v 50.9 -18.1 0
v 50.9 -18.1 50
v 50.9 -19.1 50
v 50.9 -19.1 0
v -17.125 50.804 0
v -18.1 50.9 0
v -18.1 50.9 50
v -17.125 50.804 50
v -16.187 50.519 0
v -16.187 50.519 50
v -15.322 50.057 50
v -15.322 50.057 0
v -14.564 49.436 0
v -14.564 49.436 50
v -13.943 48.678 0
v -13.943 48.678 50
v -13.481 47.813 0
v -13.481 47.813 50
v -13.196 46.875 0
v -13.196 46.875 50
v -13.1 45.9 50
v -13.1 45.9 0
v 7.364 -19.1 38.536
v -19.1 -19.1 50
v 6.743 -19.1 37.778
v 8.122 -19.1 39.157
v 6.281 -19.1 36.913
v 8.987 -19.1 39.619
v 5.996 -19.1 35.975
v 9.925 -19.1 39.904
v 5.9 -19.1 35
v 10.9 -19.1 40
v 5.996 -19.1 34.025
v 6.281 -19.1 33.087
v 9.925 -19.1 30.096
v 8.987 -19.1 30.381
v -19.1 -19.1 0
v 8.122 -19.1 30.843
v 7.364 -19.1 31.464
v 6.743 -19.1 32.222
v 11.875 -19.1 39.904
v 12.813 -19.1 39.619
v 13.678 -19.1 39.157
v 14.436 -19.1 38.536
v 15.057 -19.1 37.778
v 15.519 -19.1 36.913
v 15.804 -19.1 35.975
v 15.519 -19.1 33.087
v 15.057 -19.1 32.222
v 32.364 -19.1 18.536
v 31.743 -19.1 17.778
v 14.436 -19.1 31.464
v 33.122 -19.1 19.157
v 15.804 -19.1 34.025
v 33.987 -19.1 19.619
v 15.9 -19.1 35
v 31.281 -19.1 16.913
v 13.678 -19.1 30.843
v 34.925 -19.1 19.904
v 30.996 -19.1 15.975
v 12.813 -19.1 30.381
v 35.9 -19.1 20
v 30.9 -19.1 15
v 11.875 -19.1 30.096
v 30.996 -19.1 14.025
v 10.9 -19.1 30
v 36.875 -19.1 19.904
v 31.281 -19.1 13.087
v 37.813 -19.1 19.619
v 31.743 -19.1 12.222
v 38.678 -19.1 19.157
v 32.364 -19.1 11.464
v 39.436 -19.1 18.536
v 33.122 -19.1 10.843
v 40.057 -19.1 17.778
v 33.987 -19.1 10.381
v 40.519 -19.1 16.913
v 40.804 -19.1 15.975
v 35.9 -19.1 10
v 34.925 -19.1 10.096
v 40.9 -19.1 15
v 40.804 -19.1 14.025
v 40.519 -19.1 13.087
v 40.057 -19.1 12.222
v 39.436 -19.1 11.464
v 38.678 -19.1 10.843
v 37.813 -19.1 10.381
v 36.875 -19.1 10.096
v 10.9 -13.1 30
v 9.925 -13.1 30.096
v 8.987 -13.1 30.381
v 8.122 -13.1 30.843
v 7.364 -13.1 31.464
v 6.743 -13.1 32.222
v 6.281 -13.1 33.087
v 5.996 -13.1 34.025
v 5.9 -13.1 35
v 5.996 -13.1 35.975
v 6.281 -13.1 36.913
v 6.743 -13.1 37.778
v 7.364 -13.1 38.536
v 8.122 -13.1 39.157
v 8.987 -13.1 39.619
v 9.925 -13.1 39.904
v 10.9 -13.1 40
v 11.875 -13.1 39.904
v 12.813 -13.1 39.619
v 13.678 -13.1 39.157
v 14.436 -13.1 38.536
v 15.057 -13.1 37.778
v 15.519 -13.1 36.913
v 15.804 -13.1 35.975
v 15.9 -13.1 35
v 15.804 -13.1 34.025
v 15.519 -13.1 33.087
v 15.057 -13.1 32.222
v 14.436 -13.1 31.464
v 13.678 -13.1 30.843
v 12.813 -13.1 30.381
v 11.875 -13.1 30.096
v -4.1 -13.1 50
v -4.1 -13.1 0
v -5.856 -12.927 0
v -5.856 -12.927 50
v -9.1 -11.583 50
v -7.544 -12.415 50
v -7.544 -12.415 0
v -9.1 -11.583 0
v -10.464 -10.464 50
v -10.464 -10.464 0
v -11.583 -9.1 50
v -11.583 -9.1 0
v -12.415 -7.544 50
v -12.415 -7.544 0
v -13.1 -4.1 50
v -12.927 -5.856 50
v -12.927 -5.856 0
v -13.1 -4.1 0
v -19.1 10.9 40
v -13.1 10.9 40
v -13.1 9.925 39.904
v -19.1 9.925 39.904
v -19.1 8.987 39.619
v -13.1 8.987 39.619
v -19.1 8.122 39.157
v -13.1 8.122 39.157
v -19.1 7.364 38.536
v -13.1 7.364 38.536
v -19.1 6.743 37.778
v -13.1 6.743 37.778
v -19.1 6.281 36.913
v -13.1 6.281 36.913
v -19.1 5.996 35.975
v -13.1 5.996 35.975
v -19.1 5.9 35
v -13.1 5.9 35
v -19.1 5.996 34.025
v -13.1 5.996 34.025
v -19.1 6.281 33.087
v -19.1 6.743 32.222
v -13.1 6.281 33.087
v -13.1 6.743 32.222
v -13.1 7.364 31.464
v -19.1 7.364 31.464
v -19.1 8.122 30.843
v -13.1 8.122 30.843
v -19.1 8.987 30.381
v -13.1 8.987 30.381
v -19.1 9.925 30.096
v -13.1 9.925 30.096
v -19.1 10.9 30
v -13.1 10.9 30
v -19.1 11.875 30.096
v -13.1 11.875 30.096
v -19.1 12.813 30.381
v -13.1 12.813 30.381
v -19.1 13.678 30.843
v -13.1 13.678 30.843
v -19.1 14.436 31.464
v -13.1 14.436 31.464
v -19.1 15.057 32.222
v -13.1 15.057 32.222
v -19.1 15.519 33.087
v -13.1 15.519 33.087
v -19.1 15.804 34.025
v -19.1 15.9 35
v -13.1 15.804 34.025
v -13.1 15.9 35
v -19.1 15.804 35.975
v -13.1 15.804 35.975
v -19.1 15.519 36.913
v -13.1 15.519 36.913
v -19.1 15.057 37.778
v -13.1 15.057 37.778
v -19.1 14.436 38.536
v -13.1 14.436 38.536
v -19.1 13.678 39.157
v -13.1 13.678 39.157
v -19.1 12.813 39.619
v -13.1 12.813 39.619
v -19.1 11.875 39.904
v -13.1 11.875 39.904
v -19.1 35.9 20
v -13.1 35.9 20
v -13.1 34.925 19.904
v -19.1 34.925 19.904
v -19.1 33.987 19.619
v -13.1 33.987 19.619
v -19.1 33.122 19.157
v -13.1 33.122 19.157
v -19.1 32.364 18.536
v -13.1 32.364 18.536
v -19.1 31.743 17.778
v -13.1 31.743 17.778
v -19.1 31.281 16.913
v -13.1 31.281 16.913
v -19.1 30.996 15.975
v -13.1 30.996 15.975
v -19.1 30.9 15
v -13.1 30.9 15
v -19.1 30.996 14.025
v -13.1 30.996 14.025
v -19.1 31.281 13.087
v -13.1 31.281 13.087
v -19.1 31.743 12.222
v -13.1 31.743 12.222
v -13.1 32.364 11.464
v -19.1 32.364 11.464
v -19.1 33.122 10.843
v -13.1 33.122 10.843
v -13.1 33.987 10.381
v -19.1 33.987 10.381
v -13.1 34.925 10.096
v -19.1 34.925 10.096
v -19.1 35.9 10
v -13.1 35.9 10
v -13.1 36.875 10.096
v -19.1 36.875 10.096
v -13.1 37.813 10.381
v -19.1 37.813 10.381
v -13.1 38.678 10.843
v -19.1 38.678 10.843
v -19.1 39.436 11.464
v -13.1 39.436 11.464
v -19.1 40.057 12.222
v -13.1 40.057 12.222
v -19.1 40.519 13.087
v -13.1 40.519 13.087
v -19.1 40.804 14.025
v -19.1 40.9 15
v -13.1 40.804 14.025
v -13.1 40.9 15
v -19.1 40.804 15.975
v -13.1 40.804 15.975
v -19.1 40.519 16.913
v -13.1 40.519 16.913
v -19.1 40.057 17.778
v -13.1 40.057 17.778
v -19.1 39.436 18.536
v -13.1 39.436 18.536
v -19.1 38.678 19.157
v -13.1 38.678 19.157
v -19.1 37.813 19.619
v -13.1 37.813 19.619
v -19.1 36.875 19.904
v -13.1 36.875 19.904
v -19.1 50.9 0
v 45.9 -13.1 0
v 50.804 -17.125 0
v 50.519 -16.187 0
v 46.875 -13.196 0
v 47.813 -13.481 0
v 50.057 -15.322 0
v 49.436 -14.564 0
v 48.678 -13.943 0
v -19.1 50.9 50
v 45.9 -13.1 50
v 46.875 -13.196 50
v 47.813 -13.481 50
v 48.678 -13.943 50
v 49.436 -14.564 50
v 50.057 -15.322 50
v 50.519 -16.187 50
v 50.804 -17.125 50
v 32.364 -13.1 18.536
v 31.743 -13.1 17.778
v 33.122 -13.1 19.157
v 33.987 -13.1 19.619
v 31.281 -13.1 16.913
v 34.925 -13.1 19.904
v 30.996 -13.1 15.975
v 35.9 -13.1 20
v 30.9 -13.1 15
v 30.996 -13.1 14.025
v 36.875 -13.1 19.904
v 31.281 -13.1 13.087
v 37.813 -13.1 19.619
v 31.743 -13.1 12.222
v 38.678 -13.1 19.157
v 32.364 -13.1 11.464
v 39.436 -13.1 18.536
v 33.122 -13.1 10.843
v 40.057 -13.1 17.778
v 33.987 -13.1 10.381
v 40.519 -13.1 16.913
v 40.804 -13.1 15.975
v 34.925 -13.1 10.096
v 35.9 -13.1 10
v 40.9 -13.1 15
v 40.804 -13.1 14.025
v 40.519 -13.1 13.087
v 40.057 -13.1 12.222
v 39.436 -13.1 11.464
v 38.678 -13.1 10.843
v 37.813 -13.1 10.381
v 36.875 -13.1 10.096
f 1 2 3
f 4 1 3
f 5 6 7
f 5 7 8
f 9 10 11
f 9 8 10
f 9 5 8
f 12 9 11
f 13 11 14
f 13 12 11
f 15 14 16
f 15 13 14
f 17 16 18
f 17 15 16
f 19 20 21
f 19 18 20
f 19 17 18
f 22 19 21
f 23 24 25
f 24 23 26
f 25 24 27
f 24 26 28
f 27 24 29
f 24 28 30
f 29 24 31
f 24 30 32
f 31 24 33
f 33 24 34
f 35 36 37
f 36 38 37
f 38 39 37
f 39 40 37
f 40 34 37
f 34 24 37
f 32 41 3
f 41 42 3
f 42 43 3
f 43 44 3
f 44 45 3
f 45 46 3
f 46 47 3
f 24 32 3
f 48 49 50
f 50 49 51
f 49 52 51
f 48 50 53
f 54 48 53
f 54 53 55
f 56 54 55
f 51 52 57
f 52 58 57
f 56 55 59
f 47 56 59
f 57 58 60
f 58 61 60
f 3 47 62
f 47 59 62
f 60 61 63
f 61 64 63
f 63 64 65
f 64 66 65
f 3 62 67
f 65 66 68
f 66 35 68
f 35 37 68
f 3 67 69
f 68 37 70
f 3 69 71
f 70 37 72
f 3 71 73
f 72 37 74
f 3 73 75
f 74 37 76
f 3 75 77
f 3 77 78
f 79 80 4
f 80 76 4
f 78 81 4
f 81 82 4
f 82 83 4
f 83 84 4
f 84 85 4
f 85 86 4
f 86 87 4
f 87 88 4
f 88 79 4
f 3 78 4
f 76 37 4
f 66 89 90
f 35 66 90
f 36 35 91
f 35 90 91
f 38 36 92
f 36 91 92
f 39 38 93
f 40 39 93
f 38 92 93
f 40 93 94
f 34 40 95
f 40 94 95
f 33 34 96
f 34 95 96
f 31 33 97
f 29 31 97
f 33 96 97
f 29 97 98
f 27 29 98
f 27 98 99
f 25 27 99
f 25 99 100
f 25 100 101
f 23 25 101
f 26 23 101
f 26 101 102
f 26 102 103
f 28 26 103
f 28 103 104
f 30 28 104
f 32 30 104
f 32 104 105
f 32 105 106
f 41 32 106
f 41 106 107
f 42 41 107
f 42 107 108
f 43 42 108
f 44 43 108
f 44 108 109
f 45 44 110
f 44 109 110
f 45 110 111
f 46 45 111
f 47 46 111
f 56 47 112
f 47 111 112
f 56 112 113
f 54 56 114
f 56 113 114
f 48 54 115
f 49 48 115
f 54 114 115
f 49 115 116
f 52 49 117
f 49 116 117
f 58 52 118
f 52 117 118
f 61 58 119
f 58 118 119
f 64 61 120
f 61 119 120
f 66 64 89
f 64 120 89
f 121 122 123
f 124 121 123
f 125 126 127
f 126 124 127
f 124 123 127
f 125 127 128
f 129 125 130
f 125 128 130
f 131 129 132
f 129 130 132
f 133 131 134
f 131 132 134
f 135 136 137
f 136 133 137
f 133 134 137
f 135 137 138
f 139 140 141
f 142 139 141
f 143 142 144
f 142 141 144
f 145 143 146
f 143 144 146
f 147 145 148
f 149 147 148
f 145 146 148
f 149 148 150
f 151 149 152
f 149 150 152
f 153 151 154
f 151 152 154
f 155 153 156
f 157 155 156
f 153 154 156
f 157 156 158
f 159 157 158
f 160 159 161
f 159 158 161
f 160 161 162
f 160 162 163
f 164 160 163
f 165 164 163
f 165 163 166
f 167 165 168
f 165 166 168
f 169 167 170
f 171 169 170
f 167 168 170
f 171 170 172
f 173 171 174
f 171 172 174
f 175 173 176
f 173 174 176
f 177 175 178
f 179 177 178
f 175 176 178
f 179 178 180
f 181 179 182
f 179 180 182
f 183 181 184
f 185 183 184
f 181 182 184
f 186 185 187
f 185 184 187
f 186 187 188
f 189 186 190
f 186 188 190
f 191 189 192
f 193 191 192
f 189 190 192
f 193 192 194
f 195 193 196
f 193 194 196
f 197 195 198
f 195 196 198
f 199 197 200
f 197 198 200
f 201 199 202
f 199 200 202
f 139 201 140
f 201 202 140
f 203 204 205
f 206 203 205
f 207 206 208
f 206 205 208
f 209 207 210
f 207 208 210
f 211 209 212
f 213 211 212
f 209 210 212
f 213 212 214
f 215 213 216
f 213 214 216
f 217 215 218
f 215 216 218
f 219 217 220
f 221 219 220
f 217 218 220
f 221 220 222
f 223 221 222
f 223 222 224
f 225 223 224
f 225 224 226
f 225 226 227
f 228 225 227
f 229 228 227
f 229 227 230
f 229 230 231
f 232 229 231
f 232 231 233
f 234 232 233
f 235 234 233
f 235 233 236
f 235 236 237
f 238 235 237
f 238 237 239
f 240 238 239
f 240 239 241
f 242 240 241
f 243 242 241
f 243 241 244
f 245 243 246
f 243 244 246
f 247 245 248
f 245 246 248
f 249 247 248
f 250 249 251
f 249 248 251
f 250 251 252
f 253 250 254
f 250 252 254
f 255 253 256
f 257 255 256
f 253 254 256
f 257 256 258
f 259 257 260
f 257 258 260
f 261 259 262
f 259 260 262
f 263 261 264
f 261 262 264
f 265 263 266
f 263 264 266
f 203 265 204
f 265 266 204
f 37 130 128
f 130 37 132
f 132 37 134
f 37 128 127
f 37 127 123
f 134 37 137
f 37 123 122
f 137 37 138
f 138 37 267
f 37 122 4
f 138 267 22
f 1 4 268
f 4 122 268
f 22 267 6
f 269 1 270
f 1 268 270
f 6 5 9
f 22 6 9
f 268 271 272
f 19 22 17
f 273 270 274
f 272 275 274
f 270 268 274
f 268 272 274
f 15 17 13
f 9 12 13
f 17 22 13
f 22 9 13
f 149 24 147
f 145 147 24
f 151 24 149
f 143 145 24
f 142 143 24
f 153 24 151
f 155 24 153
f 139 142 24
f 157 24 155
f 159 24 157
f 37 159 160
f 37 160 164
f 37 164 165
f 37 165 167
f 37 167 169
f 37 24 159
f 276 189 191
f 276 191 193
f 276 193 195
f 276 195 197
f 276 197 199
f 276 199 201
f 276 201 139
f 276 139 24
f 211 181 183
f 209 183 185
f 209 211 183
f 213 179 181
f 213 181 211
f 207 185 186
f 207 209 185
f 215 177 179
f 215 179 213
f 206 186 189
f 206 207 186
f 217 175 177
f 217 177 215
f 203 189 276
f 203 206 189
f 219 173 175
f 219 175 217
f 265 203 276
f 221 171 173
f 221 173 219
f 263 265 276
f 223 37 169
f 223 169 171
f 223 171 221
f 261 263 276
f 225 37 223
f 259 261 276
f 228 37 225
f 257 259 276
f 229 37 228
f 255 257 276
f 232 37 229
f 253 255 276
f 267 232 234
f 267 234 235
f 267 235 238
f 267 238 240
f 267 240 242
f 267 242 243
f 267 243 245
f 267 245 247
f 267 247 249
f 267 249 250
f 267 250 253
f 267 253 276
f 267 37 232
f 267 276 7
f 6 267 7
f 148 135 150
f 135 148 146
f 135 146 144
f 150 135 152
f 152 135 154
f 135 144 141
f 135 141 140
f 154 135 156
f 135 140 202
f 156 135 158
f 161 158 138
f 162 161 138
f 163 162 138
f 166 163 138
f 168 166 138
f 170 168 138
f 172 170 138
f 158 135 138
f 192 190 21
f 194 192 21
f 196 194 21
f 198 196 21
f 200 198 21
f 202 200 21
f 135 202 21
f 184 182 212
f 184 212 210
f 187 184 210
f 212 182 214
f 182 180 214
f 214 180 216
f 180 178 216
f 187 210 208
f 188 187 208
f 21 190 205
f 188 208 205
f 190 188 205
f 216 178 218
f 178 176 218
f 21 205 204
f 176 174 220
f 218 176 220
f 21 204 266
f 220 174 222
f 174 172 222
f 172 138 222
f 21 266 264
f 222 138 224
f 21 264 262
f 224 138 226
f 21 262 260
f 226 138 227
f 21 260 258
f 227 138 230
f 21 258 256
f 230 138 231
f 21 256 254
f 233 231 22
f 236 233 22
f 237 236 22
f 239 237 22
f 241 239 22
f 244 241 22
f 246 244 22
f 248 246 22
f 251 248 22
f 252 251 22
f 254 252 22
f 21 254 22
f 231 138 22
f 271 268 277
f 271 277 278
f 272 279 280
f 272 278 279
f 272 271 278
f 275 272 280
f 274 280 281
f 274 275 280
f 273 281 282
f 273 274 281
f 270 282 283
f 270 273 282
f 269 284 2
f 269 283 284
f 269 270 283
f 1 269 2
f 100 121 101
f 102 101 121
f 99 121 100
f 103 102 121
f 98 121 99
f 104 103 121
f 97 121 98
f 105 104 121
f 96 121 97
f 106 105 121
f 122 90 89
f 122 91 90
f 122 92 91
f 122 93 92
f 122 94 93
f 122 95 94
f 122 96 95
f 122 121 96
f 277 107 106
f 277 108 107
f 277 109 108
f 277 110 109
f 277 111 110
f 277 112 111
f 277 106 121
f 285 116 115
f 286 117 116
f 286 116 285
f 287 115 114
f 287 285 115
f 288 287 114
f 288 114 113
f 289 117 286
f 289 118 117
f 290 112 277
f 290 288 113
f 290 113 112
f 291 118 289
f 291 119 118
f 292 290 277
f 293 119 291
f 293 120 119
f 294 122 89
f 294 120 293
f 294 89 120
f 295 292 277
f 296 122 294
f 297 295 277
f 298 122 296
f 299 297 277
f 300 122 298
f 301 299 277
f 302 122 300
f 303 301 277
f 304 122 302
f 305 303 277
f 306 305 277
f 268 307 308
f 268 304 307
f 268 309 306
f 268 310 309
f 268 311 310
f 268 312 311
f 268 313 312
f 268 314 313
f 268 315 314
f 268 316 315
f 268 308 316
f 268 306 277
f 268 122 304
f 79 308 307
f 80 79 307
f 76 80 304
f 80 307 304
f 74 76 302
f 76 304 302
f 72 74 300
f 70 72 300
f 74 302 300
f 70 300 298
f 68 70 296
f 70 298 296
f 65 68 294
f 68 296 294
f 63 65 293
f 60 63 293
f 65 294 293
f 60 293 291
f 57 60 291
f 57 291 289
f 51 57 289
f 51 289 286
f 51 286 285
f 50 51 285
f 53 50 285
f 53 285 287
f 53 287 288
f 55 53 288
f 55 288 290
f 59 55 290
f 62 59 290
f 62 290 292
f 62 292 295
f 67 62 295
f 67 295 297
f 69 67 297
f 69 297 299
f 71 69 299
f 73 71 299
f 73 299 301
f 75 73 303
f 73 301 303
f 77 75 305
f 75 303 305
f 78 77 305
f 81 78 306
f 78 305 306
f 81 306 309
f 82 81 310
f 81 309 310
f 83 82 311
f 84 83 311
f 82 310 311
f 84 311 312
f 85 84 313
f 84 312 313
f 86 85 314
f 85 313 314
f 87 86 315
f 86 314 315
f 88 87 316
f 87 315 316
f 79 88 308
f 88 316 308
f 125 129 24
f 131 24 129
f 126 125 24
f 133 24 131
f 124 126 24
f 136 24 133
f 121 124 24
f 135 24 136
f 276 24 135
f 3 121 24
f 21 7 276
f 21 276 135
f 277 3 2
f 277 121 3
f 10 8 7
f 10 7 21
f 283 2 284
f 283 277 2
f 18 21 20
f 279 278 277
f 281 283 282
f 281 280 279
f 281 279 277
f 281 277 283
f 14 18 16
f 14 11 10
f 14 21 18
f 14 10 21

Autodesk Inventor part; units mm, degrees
ref_plane "YZ Plane" through (0, 0, 0) normal (1, 0, 0) x (0, 1, 0)
ref_plane "Startebene" through (0, 0, 0) normal (0, 0, 1) x (1, 0, 0)
ref_plane "Endebene" through (0, 0, 50) normal (0, 0, 1) x (1, 0, 0)
sketch "Skizze2" plane through (0, 0, 0) normal (0, 0, 1) x (1, 0, 0)
  line L0 (-13.1, -4.1) -> (-13.1, 45.9)
  line L1 (-19.1, 50.9) -> (-18.1, 50.9)
  line L2 (-19.1, -19.1) -> (-19.1, 50.9)
  line L3 (-19.1, -19.1) -> (50.9, -19.1)
  line L4 (50.9, -18.1) -> (50.9, -19.1)
  line L5 (-4.1, -13.1) -> (45.9, -13.1)
  arc A0 (-13.1, -4.1) -> (-4.1, -13.1) centre (-4.1, -4.1) ccw
  arc A1 (-13.1, 45.9) -> (-18.1, 50.9) centre (-18.1, 45.9) ccw
  arc A2 (50.9, -18.1) -> (45.9, -13.1) centre (45.9, -18.1) ccw
  line L6 (0, 60.8698) -> (0, -10.145) construction
  line L7 (-10.145, 0) -> (60.8698, 0) construction
  point P0 (-13.1, -13.1)
  point P1 (-13.1, 50.9)
  point P2 (50.9, -13.1)
  dimension "d4" = 70
  dimension "d6" = 70
  dimension "d8" = 6
  dimension "d10" = 6
  dimension "d17" = 9
  dimension "d18" = 5
  dimension "d19" = 19.1
  dimension "d20" = 19.1
extrude "Körper" add sketch "Skizze2" along normal up to surface (50 mm away) from surface at 0
sketch "Sketch3" plane through (0, 0, 0) normal (0, 0, 1) x (1, 0, 0)
  line L0 (0, 0) -> (10, 0)
ref_plane "Work Plane10" through (0, 0, 0) normal (0, -1, 0) x (1, 0, 0)
sketch "Sketch4" plane through (0, 0, 0) normal (0, -1, 0) x (1, 0, 0)
  line L0 (-2, 0) -> (12, 0)
  line L1 (-2, 50) -> (12, 50)
  dimension "d24" = 50
sketch "Skizze5" plane through (-19.1, 50.9, 0) normal (-1, 0, 0) x (0, 0, 1)
  line L0 (0, -55) -> (50, -55) projected
  line L1 (50, -70) -> (50, 0) projected
  line L2 (50, -55) -> (50, 0)
  line L3 (0, 0) -> (50, 0) projected
  line L4 (50, 0) -> (0, 0)
  line L5 (0, -5) -> (0, -55) projected
  line L6 (0, 0) -> (0, -55)
  line L7 (0, -55) -> (50, -55)
  line L8 (0, -70) -> (0, 0) projected
  line L9 (0, 0) -> (15, 0)
  line L10 (15, 0) -> (15, -15)
  line L11 (15, -15) -> (50, -15)
  line L12 (50, -15) -> (35, -15)
  line L13 (35, -15) -> (35, -30)
  line L14 (35, -30) -> (35, -40)
  point P0 (0, -50.9)
  dimension "d25" = 15
  dimension "d26" = 15
  dimension "d27" = 15
  dimension "d28" = 15
  dimension "d29" = 10
hole "Bohrung1" at (-19.1, 35.9, 15) at (-19.1, 10.9, 35) direction (1, 0, 0) diameter 10 depth 8 tip angle 118
sketch "Skizze6" plane through (-19.1, -19.1, 0) normal (0, -1, 0) x (1, 0, 0)
  line L0 (70, 0) -> (70, 50) projected
  line L1 (15, 0) -> (65, 0) projected
  line L2 (70, 0) -> (15, 0)
  line L3 (15, 0) -> (15, 50)
  line L4 (65, 50) -> (70, 50) projected
  line L5 (15, 50) -> (70, 50)
  line L6 (15, 0) -> (15, 15)
  line L7 (15, 15) -> (55, 15)
  line L8 (70, 50) -> (70, 35)
  line L9 (70, 35) -> (30, 35)
  point P0 (19.1, 0)
  dimension "d37" = 15
  dimension "d38" = 40
  dimension "d39" = 15
  dimension "d40" = 40
hole "Bohrung2" at (35.9, -19.1, 15) at (10.9, -19.1, 35) direction (0, 1, 0) diameter 10 depth 8 tip angle 118
equation "\"d4\" = b"
equation "\"d6\" = b"
equation "\"d8\" = ParT"
equation "\"d10\" = ParT"
equation "\"d17\" = R"
equation "\"d18\" = R1"
equation "\"d19\" = ex"
equation "\"d20\" = d19"
equation "\"d11\" = G_L"
equation "\"b\" = 70"
equation "\"ParT\" = 6"
equation "\"R\" = 9"
equation "\"R1\" = 5"
equation "\"G_L\" = d24"
equation "\"ex\" = 19.1"
equation "\"G_OFFSET_START\" = 0"
equation "\"G_OFFSET_END\" = 0"
properties part number "ISO 657-1 - L70x70x6-50" material "Stahl, weich"
